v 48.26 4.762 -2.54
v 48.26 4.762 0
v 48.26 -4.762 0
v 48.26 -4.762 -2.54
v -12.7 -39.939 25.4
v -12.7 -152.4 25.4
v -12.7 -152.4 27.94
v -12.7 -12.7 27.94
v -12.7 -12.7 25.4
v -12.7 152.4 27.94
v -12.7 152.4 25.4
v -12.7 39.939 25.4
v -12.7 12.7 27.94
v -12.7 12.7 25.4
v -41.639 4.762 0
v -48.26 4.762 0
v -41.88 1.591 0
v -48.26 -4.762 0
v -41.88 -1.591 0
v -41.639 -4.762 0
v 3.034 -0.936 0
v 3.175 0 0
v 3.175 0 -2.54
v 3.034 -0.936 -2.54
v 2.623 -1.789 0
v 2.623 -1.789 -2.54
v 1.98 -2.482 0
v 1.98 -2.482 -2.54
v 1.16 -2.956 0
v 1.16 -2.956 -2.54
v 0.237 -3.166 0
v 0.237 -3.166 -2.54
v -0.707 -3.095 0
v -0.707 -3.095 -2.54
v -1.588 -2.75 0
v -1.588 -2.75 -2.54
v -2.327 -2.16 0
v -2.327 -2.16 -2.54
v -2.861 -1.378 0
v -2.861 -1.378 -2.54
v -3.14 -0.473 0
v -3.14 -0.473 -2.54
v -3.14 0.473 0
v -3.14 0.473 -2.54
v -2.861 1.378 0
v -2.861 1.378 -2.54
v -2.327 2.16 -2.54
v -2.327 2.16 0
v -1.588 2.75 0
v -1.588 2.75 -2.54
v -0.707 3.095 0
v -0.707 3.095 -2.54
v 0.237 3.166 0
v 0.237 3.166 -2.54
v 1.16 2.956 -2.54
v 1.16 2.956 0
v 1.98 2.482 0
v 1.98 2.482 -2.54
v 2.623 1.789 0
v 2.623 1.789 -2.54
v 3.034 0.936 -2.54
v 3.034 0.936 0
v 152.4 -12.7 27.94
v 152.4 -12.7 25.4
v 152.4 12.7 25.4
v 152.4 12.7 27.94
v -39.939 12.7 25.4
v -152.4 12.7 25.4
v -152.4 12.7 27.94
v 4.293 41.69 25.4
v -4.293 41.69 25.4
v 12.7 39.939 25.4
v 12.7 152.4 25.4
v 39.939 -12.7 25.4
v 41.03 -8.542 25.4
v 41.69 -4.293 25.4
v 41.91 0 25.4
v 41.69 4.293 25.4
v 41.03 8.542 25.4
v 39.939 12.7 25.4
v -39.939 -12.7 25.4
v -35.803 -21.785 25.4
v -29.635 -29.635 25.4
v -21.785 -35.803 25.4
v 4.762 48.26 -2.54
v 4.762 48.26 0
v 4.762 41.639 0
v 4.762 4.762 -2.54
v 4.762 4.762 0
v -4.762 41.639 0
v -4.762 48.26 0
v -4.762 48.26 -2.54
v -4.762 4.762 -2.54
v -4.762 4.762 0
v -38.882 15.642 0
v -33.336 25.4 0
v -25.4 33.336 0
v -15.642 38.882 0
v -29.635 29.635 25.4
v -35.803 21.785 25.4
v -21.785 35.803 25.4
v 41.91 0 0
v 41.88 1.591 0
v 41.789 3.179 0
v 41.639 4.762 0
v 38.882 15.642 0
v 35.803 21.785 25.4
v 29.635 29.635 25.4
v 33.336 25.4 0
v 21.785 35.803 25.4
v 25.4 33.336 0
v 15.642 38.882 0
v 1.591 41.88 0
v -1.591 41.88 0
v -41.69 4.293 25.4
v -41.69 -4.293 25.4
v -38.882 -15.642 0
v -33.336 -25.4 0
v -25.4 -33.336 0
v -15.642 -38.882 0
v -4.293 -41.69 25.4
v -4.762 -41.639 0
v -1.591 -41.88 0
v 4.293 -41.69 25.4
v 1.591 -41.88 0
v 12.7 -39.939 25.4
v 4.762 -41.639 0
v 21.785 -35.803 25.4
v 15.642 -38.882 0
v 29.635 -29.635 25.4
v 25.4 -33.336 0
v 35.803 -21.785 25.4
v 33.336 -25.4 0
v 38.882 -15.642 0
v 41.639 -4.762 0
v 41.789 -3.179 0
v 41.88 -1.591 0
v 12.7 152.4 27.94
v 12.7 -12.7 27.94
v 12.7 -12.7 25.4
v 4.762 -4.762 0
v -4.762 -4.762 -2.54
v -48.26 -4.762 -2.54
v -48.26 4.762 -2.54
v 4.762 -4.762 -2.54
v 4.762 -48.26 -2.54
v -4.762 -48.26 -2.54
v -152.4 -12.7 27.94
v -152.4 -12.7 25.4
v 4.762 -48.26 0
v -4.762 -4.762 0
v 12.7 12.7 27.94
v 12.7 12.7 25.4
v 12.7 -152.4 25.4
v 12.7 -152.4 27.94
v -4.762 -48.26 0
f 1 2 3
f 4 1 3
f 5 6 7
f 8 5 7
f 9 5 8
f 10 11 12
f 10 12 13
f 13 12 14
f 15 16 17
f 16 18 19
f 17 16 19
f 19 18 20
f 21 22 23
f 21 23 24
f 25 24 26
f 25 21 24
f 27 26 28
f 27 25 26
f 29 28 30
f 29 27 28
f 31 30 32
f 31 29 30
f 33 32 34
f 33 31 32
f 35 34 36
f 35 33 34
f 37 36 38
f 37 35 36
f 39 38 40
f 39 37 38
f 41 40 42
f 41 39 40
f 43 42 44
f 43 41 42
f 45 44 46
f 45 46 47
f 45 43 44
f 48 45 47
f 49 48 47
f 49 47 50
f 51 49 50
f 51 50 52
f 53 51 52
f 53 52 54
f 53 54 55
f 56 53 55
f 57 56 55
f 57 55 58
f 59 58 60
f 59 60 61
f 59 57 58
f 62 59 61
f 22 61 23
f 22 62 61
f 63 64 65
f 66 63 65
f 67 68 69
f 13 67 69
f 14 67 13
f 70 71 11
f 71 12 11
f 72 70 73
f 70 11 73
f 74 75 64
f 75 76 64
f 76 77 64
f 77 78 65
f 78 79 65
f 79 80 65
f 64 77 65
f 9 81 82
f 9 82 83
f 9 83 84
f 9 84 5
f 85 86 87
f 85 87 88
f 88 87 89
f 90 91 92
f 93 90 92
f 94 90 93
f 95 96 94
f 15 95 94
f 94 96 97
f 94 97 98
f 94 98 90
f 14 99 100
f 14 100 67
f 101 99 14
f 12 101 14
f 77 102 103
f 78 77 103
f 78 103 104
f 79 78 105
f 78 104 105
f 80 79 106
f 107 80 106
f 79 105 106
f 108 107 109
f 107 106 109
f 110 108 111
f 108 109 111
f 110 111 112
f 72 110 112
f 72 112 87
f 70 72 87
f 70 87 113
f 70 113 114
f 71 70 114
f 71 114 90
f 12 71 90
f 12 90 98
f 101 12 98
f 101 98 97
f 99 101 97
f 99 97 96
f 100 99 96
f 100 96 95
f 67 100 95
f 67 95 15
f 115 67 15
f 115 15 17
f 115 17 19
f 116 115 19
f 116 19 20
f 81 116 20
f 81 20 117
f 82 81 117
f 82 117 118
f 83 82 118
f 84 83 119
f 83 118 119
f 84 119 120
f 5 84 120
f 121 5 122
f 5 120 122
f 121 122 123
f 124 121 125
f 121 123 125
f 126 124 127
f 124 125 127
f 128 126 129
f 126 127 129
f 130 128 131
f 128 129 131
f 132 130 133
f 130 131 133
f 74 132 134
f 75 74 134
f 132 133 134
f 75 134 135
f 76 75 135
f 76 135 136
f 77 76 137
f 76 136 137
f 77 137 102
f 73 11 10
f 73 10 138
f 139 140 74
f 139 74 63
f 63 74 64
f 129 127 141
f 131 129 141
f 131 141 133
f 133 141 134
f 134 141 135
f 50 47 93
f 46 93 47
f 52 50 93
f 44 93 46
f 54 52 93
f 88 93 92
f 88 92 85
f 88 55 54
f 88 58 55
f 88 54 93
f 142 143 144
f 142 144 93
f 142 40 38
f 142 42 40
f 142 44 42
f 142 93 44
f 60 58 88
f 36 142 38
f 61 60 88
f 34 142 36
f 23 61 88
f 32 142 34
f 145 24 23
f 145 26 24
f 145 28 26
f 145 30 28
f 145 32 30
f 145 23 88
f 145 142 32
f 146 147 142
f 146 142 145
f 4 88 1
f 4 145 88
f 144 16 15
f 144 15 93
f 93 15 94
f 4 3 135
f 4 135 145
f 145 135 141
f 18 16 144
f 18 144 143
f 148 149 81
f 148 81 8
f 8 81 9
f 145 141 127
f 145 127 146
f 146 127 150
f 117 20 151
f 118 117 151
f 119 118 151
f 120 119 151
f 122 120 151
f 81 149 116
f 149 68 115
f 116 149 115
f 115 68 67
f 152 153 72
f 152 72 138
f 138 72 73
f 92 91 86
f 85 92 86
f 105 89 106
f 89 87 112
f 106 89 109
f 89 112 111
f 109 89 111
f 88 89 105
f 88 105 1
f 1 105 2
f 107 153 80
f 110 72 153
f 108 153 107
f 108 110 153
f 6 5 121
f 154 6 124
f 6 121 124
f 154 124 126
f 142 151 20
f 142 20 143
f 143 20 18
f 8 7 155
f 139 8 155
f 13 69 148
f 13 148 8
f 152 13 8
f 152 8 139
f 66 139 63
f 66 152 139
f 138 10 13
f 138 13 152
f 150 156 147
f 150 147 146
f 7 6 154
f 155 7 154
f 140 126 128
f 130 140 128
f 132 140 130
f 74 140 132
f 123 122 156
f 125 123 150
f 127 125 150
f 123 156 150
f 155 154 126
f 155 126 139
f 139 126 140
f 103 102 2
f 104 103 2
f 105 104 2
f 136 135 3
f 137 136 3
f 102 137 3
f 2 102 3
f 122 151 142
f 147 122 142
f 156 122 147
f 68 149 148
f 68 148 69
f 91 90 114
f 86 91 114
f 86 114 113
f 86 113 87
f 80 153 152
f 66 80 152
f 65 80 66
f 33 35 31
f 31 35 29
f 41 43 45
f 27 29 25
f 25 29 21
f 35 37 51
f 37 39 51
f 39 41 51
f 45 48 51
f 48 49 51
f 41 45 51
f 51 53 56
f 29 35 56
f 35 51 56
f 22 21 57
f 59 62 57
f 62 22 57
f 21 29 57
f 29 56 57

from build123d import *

# Parameters (mm, degrees)
F0_R     = 41.91
F1_DEPTH = 25.4
F2_W     = 25.4
F2_H     = 139.7
F2_W_2   = 139.7
F2_H_2   = 25.4
F3_DEPTH = 2.54
F4_W     = 9.525
F4_H     = 43.4975
F4_W_2   = 43.4975
F4_H_2   = 9.525
F4_R     = 3.175
F5_DEPTH = 2.54


with BuildPart() as f1:
    # F0 (on Top) → F1 (new body)
    with BuildSketch(Plane.XY):
        Circle(F0_R)
    extrude(amount=F1_DEPTH)

    # F2 (on face) → F3 (join)
    with BuildSketch(Plane.XY.offset(25.4)):
        with Locations((0, 82.55)):
            Rectangle(F2_W, F2_H)
        with Locations((82.55, 0)):
            Rectangle(F2_W_2, F2_H_2)
        Rectangle(F2_W, F2_H_2)
        with Locations((-82.55, 0)):
            Rectangle(F2_W_2, F2_H_2)
        with Locations((0, -82.55)):
            Rectangle(F2_W, F2_H)
    extrude(amount=F3_DEPTH)

    # F4 (on face) → F5 (join)
    with BuildSketch(Plane(origin=(0, 0, 0), x_dir=(1, 0, 0), z_dir=(0, 0, -1))):
        with Locations((0, -26.51125)):
            Rectangle(F4_W, F4_H)
        with Locations((-26.51125, 0)):
            Rectangle(F4_W_2, F4_H_2)
        Rectangle(F4_W, F4_H_2)
        Circle(F4_R, mode=Mode.SUBTRACT)
        with Locations((26.51125, 0)):
            Rectangle(F4_W_2, F4_H_2)
        with Locations((0, 26.51125)):
            Rectangle(F4_W, F4_H)
    extrude(amount=F5_DEPTH)


solid = f1.part
